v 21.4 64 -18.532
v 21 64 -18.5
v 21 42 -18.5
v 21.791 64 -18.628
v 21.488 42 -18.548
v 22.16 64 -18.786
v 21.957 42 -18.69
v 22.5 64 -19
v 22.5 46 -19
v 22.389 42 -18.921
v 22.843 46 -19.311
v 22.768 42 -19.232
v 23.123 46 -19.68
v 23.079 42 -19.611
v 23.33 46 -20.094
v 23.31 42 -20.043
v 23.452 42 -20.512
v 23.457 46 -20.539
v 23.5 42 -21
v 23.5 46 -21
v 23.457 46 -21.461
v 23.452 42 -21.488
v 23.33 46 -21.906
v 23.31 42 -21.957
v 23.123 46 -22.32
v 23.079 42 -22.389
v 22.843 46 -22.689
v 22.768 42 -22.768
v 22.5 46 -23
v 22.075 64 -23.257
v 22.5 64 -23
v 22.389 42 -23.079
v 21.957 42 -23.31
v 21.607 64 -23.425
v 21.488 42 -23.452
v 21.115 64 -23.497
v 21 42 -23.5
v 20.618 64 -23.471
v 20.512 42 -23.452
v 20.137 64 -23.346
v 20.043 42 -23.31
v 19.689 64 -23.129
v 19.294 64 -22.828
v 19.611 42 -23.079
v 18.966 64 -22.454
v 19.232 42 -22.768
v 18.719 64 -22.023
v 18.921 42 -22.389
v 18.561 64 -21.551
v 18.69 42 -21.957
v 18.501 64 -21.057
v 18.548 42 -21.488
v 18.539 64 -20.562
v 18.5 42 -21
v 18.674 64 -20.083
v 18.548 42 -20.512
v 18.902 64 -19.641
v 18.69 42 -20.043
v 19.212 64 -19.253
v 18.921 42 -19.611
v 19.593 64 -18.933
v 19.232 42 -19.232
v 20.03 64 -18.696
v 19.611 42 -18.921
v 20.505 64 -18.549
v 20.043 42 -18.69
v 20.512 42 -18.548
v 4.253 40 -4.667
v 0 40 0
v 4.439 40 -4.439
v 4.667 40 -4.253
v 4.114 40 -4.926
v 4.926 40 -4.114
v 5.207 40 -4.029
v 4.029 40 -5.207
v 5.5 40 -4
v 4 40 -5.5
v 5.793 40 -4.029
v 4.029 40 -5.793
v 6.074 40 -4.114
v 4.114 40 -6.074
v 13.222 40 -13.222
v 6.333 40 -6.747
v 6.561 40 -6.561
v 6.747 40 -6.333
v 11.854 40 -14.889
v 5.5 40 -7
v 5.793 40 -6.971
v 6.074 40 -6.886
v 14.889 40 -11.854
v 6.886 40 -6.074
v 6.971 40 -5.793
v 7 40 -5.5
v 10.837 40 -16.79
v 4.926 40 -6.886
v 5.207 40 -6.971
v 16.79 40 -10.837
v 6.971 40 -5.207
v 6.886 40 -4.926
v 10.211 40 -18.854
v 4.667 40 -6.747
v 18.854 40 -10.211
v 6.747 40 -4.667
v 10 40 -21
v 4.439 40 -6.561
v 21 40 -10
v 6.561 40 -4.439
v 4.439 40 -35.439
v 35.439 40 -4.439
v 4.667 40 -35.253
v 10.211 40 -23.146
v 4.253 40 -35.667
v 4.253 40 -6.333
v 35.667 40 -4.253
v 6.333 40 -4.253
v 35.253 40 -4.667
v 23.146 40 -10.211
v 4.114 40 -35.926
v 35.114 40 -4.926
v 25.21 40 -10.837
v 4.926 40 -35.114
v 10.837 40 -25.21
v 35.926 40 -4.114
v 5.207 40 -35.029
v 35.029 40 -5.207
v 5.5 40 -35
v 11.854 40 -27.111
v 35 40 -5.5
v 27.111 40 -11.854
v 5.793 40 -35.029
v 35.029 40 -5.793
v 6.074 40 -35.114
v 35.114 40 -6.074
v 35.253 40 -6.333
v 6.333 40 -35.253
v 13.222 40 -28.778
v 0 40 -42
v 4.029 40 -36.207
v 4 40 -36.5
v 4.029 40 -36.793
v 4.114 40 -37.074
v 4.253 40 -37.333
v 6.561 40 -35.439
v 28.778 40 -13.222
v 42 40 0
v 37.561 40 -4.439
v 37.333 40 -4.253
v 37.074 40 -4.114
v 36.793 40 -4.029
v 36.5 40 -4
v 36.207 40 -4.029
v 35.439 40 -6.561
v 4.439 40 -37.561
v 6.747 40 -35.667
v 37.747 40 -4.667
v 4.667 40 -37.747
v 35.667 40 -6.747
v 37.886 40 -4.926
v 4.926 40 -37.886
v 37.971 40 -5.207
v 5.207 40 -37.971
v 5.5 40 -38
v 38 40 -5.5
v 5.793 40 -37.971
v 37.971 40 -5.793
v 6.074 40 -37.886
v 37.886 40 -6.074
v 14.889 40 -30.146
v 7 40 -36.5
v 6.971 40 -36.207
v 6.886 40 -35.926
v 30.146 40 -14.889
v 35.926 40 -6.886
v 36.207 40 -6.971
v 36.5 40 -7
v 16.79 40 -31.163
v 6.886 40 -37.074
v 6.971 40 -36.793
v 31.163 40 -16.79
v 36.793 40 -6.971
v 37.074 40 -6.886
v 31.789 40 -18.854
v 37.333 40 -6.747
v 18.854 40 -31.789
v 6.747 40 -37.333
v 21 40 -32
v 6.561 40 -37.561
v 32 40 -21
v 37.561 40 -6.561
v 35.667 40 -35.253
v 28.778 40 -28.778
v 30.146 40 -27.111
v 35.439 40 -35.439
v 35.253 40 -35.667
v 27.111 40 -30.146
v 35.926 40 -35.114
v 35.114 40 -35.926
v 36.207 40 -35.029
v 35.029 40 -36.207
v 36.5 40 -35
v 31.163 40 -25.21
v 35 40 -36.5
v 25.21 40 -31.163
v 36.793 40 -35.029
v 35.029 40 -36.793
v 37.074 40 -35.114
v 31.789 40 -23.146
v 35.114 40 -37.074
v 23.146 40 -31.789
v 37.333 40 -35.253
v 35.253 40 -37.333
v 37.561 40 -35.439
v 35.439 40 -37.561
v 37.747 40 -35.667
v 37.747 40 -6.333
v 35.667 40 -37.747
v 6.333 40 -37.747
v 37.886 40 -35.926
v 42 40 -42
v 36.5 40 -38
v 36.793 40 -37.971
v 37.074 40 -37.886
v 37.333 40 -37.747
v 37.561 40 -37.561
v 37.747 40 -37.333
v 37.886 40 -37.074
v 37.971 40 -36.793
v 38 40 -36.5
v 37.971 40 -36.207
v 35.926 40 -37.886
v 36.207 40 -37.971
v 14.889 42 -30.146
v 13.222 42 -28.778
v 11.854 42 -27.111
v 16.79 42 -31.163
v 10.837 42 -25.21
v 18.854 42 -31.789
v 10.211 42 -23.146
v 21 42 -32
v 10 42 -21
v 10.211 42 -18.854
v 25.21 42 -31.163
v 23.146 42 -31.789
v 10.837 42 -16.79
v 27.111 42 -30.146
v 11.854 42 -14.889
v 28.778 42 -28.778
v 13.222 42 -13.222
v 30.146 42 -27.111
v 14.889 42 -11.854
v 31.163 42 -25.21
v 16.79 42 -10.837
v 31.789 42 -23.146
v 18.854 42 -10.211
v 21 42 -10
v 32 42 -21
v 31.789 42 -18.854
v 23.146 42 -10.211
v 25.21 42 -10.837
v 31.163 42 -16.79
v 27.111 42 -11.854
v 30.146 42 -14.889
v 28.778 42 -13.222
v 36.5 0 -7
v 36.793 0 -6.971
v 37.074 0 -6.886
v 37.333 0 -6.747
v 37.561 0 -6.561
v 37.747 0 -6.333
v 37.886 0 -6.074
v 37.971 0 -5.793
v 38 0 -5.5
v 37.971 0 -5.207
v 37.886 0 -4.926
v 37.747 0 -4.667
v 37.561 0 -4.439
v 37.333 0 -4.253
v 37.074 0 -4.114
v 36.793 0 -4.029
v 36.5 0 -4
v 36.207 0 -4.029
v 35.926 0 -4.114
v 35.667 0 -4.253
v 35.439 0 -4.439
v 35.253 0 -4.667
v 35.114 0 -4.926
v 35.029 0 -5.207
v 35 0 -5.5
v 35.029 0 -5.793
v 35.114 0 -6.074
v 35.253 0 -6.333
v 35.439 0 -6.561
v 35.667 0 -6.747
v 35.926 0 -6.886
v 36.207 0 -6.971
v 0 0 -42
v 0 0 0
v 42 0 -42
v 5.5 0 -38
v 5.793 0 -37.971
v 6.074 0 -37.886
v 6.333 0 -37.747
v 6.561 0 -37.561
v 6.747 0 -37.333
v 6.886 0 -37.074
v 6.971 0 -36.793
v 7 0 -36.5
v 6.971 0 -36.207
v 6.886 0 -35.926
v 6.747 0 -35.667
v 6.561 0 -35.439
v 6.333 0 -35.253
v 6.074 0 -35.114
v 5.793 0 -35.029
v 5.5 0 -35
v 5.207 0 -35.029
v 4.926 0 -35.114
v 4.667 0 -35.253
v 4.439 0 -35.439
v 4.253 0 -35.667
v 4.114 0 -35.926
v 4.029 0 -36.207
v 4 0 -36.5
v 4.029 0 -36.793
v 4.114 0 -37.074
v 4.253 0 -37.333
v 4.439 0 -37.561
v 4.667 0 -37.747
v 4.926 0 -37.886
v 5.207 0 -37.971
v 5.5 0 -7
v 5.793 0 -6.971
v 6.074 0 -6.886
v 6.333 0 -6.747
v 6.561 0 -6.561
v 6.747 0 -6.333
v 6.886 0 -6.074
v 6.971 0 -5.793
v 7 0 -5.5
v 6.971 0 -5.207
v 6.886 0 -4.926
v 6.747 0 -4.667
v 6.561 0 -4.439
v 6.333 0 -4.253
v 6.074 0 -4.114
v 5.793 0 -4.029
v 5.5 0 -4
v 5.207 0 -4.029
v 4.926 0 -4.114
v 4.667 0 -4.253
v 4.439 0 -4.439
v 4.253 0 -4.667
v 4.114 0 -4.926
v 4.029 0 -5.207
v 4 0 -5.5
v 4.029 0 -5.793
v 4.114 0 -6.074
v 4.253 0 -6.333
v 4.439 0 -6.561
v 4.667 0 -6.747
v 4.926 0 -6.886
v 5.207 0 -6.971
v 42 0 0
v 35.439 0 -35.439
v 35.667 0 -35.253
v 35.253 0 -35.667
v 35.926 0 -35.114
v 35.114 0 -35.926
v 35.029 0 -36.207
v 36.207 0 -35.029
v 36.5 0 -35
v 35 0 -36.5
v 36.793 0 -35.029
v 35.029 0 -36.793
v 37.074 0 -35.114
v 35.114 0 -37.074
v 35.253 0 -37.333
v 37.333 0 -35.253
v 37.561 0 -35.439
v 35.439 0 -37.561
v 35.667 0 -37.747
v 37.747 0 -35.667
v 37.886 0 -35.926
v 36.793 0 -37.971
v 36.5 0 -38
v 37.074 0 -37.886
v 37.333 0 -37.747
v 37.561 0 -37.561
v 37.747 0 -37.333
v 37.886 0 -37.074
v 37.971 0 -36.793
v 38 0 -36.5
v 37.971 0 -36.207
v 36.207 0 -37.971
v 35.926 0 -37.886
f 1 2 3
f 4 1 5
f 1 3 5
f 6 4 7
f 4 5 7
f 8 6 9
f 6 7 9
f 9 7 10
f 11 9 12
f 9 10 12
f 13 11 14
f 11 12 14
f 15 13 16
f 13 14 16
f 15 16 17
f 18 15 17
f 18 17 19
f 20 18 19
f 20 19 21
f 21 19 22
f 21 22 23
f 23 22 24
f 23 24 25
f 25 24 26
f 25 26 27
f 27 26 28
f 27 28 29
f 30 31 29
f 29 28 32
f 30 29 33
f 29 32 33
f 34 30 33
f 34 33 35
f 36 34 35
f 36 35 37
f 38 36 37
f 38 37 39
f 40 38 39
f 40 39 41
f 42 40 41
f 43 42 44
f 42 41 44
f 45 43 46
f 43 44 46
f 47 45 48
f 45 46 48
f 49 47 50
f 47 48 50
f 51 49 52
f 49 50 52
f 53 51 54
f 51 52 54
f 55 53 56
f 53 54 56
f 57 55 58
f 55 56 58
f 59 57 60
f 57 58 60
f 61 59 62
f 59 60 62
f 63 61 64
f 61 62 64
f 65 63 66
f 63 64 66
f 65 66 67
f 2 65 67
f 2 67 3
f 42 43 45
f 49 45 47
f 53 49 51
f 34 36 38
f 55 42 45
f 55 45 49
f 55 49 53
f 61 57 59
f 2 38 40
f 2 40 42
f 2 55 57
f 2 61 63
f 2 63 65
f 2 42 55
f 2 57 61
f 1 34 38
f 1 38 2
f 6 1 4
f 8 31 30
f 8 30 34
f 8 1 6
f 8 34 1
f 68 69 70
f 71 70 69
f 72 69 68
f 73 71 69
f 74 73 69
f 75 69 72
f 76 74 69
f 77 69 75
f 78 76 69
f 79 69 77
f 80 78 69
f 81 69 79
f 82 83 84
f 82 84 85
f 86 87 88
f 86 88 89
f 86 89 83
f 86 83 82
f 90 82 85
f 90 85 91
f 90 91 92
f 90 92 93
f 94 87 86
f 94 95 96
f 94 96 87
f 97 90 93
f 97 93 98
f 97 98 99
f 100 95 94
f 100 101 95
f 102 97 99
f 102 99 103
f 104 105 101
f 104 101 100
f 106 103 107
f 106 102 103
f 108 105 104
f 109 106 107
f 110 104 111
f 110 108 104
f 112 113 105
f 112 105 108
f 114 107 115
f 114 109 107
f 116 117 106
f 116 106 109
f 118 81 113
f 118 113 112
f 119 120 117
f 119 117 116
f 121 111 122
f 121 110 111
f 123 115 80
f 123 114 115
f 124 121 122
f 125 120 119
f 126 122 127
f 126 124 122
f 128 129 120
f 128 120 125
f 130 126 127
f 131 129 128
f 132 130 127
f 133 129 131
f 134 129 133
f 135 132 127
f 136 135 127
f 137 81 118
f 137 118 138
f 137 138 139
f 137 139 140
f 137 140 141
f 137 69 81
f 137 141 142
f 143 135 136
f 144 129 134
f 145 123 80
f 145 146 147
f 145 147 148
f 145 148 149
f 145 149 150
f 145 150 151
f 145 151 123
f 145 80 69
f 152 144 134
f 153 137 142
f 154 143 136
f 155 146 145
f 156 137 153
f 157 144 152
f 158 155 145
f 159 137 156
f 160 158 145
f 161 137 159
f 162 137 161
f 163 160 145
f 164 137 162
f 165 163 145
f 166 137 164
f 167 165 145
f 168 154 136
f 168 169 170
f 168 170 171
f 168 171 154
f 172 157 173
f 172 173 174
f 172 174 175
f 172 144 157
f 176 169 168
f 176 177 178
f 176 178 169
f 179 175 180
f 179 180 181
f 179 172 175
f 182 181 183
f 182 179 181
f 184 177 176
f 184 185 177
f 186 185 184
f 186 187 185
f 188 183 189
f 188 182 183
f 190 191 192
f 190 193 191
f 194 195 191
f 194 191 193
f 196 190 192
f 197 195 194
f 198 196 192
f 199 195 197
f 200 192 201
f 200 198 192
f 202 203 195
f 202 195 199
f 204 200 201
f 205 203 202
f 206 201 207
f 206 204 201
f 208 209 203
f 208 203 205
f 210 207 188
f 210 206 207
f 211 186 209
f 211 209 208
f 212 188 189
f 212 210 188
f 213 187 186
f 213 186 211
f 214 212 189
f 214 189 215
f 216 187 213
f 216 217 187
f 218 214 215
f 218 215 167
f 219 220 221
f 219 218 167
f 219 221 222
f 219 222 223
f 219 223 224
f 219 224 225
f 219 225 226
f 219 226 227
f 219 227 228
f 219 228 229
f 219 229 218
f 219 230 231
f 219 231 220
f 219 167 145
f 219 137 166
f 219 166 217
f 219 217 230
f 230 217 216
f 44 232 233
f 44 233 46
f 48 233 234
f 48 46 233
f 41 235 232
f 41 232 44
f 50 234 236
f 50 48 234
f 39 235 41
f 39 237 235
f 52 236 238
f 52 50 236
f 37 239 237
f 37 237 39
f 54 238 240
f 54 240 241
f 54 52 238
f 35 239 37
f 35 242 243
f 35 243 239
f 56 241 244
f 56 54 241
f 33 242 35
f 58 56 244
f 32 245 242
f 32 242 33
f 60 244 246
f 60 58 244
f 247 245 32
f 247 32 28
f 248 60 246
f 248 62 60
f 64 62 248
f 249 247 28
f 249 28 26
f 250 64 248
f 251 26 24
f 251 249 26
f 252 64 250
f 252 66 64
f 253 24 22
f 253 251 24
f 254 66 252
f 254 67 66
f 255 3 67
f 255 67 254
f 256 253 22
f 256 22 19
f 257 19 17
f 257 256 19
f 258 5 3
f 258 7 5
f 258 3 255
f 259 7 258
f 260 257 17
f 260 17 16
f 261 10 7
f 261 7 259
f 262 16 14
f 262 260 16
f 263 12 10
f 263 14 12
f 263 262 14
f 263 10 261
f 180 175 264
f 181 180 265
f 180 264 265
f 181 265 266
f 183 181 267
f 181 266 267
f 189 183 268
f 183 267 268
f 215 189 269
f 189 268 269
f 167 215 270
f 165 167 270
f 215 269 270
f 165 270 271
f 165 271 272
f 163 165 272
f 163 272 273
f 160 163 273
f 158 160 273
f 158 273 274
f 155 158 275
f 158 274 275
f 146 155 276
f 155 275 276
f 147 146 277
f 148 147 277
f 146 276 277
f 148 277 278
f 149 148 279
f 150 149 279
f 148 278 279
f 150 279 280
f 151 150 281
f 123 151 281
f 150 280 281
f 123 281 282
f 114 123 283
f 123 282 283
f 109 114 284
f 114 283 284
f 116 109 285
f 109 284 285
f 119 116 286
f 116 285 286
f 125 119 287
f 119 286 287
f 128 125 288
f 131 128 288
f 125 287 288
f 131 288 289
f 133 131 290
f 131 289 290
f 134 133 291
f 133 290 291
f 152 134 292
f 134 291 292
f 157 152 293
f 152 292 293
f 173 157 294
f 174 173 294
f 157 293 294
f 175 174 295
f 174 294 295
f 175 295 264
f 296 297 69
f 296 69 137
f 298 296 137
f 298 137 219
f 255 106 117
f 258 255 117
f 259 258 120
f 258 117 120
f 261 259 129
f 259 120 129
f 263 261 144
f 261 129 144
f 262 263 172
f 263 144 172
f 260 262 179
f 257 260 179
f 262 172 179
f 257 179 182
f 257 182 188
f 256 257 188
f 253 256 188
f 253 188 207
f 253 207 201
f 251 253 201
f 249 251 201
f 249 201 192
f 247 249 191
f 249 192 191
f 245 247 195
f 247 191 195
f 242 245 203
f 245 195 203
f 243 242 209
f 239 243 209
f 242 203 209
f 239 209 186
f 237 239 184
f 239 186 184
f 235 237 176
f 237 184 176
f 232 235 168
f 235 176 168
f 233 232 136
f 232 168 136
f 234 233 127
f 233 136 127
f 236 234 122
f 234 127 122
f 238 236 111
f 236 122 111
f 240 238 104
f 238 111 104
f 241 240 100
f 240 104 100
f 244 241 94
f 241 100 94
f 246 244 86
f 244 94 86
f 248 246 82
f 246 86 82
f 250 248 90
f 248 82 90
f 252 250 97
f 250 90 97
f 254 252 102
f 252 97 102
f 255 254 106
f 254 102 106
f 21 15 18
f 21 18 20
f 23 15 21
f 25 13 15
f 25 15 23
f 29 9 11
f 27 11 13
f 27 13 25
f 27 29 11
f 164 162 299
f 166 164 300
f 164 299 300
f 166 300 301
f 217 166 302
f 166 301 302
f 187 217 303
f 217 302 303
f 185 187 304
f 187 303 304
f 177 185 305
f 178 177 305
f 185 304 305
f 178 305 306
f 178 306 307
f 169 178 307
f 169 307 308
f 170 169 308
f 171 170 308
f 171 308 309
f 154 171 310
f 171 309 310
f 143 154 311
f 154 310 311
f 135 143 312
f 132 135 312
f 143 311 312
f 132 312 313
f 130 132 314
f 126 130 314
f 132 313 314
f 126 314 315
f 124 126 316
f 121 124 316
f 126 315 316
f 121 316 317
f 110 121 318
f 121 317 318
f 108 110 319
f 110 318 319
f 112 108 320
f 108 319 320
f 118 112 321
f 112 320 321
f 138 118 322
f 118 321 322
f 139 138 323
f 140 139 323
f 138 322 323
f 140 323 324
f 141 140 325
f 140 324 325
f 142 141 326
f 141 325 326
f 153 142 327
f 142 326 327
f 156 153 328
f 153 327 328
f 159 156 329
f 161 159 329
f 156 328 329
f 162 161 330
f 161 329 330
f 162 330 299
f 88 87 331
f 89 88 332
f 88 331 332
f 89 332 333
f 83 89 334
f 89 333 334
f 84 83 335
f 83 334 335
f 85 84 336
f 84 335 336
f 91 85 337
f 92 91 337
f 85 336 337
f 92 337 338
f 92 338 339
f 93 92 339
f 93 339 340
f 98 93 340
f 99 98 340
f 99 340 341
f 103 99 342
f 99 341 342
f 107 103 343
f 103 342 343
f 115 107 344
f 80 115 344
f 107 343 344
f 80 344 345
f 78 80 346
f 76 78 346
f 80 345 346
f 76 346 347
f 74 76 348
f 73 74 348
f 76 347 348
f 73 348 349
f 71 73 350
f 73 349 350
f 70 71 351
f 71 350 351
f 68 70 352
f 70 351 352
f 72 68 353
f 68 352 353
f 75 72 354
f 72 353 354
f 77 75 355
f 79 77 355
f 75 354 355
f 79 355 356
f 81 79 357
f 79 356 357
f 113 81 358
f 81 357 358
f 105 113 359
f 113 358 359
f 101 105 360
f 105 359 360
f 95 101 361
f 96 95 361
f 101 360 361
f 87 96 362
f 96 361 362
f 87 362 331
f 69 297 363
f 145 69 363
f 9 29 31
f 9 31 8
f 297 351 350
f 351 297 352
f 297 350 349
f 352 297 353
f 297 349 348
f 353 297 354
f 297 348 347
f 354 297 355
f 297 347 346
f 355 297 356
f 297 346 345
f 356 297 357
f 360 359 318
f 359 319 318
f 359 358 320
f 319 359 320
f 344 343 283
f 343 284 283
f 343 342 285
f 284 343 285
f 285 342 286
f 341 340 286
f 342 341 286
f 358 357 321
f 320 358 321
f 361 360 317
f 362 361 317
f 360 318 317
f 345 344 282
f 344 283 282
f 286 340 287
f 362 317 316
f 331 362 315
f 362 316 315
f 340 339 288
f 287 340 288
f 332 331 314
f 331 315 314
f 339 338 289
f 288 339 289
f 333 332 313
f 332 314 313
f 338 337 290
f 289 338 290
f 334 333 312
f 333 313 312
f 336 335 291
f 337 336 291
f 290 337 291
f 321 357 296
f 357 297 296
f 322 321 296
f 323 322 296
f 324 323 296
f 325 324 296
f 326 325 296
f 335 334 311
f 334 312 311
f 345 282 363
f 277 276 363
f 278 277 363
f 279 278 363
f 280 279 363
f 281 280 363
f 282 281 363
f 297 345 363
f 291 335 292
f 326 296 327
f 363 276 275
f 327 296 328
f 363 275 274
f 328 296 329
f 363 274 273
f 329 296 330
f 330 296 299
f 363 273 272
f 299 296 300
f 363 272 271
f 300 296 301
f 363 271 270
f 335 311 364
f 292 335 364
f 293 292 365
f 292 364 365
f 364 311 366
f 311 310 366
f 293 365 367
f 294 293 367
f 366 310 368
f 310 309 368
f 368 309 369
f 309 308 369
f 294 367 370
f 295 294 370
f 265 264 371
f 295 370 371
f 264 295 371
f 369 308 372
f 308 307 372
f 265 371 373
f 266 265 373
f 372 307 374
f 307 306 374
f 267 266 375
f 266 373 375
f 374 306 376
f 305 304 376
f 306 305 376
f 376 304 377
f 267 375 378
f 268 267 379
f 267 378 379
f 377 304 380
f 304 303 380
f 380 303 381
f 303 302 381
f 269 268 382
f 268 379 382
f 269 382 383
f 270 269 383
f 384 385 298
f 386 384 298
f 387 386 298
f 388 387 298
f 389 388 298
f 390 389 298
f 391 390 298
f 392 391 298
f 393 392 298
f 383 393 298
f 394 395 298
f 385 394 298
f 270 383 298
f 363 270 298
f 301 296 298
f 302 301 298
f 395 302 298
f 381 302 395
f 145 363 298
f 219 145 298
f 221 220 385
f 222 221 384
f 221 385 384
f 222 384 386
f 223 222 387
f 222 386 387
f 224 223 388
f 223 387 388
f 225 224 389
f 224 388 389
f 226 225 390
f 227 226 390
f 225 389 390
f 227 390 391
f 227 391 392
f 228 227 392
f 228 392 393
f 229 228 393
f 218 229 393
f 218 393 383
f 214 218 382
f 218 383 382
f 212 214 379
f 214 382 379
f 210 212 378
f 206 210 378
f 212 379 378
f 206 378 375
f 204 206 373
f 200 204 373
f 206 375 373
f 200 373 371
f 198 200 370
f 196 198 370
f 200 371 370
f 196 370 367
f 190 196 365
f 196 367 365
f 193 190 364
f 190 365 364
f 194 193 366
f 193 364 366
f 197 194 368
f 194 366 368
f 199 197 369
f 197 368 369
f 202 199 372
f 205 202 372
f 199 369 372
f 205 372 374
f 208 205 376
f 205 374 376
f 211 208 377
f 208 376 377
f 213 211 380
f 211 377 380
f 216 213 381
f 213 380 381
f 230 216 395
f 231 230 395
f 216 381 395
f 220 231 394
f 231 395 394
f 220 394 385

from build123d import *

# Parameters (mm, degrees)
SKETCH_1_W          = 42
SKETCH_1_H          = 42
EXTRUDE_1_DEPTH     = 40
SKETCH_2_R          = 11
EXTRUDE_2_DEPTH     = 2
SKETCH_3_R          = 1.5
CUT_EXTRUDE_1_DEPTH = 40
SKETCH_4_R          = 2.5
EXTRUDE_3_DEPTH     = 22
CUT_EXTRUDE_START   = -18
CUT_EXTRUDE_2_DEPTH = 18


with BuildPart() as part:
    # 草图1 → 凸台-拉伸1 (new body)
    with BuildSketch(Plane(origin=(0, 0, 0), x_dir=(1, 0, 0), z_dir=(0, 1, 0))):
        with Locations((21, 21)):
            Rectangle(SKETCH_1_W, SKETCH_1_H)
    extrude(amount=EXTRUDE_1_DEPTH)

    # 草图2 → 凸台-拉伸2 (add)
    with BuildSketch(Plane(origin=(0, 40, 0), x_dir=(1, 0, 0), z_dir=(0, 1, 0))):
        with Locations(Location((21, 21, 0), (0, 0, 270))):
            Circle(SKETCH_2_R)
    extrude(amount=EXTRUDE_2_DEPTH)

    # 草图3 → 切除-拉伸1 (cut)
    with BuildSketch(Plane.XZ):
        with Locations(Location((5.5, -36.5, 0), (0, 0, 270))):
            Circle(SKETCH_3_R)
        with Locations(Location((36.5, -36.5, 0), (0, 0, 270))):
            Circle(SKETCH_3_R)
        with Locations(Location((36.5, -5.5, 0), (0, 0, 270))):
            Circle(SKETCH_3_R)
        with Locations(Location((5.5, -5.5, 0), (0, 0, 270))):
            Circle(SKETCH_3_R)
    extrude(amount=-CUT_EXTRUDE_1_DEPTH, mode=Mode.SUBTRACT)

    # 草图4 → 凸台-拉伸3 (add)
    with BuildSketch(Plane(origin=(0, 42, 0), x_dir=(1, 0, 0), z_dir=(0, 1, 0))):
        with Locations(Location((21, 21, 0), (0, 0, 270))):
            Circle(SKETCH_4_R)
    extrude(amount=EXTRUDE_3_DEPTH)

    # 草图6 → 切除-拉伸2 (cut)
    with BuildSketch(Plane(origin=(0, 64, 0), x_dir=(1, 0, 0), z_dir=(0, 1, 0)).offset(CUT_EXTRUDE_START)):
        with BuildLine():
            Line((22.5, 23), (22.5, 21))
            Line((22.5, 21), (22.5, 19))
            ThreePointArc((22.5, 19), (23.236067977, 19.881966011), (23.5, 21))
            ThreePointArc((23.5, 21), (23.236067977, 22.118033989), (22.5, 23))
        make_face()
    extrude(amount=CUT_EXTRUDE_2_DEPTH, mode=Mode.SUBTRACT)


solid = part.part
